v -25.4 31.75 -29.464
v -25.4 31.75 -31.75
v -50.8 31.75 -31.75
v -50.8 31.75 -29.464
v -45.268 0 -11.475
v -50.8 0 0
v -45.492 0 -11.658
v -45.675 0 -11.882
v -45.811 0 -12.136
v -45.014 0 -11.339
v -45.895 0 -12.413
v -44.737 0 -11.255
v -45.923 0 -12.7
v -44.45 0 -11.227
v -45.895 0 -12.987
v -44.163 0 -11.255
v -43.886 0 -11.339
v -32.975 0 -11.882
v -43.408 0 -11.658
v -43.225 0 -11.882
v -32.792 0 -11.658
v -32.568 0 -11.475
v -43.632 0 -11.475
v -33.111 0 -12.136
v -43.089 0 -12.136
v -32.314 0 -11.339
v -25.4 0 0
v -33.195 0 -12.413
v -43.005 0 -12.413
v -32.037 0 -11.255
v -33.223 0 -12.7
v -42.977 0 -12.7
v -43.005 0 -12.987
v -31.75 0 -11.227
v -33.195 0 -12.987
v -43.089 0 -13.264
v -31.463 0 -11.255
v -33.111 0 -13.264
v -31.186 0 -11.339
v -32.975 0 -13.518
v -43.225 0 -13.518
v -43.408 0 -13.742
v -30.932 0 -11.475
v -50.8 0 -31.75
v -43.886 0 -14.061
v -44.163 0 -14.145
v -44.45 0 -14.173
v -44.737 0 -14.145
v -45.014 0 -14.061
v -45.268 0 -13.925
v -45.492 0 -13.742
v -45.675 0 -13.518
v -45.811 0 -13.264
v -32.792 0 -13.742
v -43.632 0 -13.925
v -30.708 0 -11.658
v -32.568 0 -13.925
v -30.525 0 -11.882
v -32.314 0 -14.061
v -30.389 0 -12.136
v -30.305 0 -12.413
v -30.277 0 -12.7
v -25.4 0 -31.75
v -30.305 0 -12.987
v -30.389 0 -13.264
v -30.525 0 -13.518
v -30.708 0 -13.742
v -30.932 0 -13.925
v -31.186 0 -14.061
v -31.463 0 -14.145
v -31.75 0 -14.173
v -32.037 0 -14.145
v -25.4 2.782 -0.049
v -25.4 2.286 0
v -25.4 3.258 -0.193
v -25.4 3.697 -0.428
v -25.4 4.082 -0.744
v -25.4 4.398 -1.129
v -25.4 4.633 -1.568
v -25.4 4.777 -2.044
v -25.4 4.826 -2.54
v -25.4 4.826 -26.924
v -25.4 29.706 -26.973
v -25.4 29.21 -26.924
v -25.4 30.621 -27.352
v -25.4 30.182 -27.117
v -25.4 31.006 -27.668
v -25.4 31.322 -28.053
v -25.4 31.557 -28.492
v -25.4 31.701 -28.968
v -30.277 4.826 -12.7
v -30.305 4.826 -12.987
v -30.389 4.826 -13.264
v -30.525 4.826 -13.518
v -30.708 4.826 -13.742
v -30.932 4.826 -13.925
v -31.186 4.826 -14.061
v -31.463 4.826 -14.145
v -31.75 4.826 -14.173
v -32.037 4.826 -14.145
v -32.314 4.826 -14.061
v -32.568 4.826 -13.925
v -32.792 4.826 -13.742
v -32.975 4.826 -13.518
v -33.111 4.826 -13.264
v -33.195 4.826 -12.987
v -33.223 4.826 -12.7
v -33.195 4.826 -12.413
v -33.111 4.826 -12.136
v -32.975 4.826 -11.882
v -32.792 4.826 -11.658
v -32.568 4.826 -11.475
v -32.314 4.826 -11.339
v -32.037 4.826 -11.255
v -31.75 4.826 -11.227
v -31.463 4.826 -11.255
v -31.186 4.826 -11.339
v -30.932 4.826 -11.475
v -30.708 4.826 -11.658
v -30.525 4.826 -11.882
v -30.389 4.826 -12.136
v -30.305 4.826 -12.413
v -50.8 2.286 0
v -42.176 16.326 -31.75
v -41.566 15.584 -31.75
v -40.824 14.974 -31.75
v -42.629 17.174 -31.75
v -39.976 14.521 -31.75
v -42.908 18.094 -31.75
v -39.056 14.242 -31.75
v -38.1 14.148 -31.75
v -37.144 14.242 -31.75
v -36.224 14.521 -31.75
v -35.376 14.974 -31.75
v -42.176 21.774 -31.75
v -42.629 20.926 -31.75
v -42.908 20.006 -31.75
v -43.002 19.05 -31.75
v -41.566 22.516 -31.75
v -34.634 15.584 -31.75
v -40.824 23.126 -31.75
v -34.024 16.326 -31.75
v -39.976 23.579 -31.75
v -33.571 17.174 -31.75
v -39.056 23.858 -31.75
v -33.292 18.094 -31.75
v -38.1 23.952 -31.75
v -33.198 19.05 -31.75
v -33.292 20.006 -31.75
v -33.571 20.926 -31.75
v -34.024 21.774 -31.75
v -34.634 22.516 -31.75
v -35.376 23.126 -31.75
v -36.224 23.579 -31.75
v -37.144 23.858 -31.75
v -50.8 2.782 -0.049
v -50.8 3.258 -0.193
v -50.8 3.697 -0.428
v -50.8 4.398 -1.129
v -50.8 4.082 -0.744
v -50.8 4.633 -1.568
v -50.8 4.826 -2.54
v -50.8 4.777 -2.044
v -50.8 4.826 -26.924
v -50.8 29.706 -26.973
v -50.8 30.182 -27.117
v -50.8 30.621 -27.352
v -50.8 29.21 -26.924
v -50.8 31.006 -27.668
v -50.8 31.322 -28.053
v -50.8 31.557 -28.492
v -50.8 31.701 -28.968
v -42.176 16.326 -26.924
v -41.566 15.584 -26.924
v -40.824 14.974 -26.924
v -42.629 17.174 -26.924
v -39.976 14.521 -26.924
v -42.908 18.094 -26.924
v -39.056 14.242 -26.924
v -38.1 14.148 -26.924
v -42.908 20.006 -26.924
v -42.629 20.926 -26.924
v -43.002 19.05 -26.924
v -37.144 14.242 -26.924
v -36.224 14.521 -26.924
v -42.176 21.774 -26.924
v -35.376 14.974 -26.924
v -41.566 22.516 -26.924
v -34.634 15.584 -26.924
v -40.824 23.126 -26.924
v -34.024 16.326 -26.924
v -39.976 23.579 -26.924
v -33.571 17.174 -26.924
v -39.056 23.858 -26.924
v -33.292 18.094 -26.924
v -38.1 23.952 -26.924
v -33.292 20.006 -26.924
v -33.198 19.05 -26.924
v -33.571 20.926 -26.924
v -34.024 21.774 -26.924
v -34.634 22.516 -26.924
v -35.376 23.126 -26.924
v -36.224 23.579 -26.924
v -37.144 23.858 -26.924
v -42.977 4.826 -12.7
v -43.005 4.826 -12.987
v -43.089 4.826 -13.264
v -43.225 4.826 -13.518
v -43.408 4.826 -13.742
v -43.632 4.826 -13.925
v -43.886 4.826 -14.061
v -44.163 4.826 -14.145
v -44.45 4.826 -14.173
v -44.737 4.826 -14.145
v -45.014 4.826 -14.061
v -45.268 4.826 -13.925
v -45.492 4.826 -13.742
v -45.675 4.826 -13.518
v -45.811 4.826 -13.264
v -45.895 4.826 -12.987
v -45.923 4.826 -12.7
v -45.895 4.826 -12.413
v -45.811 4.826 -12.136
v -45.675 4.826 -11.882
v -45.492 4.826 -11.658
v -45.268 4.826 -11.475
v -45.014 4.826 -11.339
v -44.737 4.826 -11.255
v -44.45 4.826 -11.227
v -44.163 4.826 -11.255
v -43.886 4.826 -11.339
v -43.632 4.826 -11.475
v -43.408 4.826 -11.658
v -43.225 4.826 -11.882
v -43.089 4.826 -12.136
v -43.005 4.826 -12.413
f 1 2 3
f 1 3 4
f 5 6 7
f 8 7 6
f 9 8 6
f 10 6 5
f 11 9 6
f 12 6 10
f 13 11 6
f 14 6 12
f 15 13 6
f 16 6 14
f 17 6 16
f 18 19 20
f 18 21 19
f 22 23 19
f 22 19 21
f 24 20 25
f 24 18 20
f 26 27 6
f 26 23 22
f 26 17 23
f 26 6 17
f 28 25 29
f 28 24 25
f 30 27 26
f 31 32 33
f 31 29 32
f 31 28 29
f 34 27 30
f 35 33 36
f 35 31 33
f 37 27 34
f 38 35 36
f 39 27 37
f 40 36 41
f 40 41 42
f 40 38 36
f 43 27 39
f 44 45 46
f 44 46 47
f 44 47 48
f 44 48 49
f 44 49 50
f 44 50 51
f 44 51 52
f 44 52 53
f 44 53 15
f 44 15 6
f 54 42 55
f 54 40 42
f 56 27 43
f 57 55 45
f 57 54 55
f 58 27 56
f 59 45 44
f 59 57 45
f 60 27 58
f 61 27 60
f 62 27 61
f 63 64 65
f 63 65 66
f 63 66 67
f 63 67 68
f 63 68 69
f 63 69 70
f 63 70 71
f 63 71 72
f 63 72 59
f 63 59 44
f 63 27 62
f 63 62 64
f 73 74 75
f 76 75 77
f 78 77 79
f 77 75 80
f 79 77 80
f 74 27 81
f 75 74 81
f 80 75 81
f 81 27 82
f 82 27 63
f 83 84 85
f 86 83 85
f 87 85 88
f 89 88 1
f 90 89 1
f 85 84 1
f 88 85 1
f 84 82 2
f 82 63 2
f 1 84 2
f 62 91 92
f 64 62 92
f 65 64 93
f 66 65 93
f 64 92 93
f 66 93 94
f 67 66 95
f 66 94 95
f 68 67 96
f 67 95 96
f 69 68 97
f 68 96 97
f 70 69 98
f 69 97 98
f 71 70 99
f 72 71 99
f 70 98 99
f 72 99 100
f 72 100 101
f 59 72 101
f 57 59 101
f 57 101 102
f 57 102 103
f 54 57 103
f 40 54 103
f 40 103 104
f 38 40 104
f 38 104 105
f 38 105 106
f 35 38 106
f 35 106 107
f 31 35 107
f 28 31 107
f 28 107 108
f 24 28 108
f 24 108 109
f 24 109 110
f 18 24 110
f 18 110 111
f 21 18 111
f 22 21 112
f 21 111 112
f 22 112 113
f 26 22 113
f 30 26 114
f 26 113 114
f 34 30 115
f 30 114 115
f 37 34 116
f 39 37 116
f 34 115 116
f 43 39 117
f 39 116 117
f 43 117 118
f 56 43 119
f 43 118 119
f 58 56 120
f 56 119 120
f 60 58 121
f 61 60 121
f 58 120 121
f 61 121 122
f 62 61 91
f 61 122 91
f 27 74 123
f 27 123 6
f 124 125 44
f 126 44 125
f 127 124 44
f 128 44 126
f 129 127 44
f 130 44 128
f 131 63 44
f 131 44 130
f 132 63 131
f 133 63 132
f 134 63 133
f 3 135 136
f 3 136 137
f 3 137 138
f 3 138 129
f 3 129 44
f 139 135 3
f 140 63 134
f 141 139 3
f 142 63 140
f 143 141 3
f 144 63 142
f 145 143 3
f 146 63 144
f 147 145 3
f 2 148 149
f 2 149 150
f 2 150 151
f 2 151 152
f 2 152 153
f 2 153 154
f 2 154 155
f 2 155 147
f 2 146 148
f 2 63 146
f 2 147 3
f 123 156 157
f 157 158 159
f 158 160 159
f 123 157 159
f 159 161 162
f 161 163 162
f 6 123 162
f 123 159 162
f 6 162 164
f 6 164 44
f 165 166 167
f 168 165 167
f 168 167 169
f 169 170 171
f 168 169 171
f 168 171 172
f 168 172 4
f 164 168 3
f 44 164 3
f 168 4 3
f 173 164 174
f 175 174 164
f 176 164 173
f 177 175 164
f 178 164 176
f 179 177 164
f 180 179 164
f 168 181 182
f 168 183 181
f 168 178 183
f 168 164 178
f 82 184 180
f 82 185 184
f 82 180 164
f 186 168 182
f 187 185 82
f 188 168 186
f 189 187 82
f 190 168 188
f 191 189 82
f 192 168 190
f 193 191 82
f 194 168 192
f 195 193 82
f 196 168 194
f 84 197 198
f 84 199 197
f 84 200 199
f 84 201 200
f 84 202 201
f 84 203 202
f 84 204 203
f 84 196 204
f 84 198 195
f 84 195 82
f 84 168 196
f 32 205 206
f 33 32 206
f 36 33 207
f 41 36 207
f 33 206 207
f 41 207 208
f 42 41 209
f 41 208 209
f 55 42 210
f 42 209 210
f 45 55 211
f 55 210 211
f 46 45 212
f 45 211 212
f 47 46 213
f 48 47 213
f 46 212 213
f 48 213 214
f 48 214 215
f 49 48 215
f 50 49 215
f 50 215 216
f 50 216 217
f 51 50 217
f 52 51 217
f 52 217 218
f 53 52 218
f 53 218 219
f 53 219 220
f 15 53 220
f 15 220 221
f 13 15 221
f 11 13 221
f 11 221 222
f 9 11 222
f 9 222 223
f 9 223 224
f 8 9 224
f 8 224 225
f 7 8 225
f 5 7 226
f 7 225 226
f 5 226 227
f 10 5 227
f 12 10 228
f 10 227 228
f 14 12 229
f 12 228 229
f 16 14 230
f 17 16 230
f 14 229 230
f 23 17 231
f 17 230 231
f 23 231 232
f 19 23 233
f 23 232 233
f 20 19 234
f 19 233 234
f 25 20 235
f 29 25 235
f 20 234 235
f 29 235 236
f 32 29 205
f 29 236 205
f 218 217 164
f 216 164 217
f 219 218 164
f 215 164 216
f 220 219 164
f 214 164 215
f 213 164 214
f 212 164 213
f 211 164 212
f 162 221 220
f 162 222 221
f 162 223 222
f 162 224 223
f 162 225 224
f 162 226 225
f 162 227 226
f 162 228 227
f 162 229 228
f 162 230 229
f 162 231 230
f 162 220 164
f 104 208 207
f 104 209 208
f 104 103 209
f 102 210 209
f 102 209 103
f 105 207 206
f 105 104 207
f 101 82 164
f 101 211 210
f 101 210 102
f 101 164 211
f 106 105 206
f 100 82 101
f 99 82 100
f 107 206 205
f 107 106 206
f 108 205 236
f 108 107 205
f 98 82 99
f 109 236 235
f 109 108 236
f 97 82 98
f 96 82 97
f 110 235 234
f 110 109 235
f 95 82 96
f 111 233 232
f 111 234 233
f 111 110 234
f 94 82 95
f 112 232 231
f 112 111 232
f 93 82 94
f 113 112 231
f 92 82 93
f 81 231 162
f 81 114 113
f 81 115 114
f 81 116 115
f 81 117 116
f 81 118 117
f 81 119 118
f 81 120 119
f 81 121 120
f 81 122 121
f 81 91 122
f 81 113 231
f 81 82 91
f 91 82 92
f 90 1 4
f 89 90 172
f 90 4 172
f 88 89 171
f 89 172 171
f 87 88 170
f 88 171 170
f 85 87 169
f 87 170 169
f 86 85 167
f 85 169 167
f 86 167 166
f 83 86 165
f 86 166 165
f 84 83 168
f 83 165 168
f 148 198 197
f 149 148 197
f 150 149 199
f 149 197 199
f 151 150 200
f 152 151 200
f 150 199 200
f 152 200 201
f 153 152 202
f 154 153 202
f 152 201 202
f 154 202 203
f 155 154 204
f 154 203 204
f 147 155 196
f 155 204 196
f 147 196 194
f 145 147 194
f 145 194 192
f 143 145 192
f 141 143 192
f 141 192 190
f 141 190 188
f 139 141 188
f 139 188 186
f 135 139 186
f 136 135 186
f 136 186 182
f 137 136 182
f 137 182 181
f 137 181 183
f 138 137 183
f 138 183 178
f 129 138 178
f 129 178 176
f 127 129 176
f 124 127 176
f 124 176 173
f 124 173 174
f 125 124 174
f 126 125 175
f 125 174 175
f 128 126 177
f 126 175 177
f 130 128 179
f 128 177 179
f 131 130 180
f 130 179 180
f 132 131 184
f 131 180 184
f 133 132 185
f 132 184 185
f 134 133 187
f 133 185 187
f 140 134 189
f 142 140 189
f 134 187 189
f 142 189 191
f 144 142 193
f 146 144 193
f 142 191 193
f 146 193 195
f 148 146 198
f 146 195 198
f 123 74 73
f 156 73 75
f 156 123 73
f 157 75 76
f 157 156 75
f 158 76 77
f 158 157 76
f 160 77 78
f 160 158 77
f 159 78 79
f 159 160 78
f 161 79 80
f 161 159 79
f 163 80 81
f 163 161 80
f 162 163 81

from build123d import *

# Parameters (mm, degrees)
BOSS_EXTRUDE1_DEPTH     = 50.8
SKETCH3_R               = 4.9022
CUT_EXTRUDE1_DEPTH      = 50.8
SKETCH4_R               = 1.4732
CUT_EXTRUDE2_DEPTH      = 50.8
FILLET1_R               = 2.54
SKETCH5_W               = 25.4
SKETCH5_H               = 31.75
CUT_EXTRUDE3_DEPTH      = 27.924
CUT_EXTRUDE3_DEPTH_BACK = 5.826


with BuildPart() as part:
    # Sketch2 → Boss-Extrude1 (new body)
    with BuildSketch(Plane(origin=(0, 0, 0), x_dir=(0, 0, -1), z_dir=(1, 0, 0))):
        Polygon((0, 0), (31.75, 0), (31.75, 31.75), (26.924, 31.75), (26.924, 4.826), (0, 4.826), align=None)
    extrude(amount=-BOSS_EXTRUDE1_DEPTH)

    # Sketch3 → Cut-Extrude1 (cut)
    with BuildSketch(Plane.XY.offset(-26.924)):
        with Locations((-38.1, 19.05)):
            Circle(SKETCH3_R)
        with Locations((-12.7, 19.05)):
            Circle(SKETCH3_R)
    extrude(amount=-CUT_EXTRUDE1_DEPTH, mode=Mode.SUBTRACT)

    # Sketch4 → Cut-Extrude2 (cut)
    with BuildSketch(Plane(origin=(0, 4.826, 0), x_dir=(1, 0, 0), z_dir=(0, 1, 0))):
        with Locations((-44.45, 12.7)):
            Circle(SKETCH4_R)
        with Locations((-31.75, 12.7)):
            Circle(SKETCH4_R)
    extrude(amount=-CUT_EXTRUDE2_DEPTH, mode=Mode.SUBTRACT)

    # Fillet1
    fillet1_edges = [part.edges().sort_by_distance(p)[0] for p in [
        (-25.4, 4.826, 0),
        (-25.4, 31.75, -26.924),
    ]]
    fillet(fillet1_edges, radius=FILLET1_R)

    # Sketch5 → Cut-Extrude3 (cut, two sides)
    with BuildSketch(Plane.XY.offset(-26.924)) as cut_extrude3_sk:
        with Locations((-12.7, 15.875)):
            Rectangle(SKETCH5_W, SKETCH5_H)
    extrude(amount=CUT_EXTRUDE3_DEPTH, mode=Mode.SUBTRACT)
    extrude(cut_extrude3_sk.sketch, amount=-CUT_EXTRUDE3_DEPTH_BACK, mode=Mode.SUBTRACT)


solid = part.part
